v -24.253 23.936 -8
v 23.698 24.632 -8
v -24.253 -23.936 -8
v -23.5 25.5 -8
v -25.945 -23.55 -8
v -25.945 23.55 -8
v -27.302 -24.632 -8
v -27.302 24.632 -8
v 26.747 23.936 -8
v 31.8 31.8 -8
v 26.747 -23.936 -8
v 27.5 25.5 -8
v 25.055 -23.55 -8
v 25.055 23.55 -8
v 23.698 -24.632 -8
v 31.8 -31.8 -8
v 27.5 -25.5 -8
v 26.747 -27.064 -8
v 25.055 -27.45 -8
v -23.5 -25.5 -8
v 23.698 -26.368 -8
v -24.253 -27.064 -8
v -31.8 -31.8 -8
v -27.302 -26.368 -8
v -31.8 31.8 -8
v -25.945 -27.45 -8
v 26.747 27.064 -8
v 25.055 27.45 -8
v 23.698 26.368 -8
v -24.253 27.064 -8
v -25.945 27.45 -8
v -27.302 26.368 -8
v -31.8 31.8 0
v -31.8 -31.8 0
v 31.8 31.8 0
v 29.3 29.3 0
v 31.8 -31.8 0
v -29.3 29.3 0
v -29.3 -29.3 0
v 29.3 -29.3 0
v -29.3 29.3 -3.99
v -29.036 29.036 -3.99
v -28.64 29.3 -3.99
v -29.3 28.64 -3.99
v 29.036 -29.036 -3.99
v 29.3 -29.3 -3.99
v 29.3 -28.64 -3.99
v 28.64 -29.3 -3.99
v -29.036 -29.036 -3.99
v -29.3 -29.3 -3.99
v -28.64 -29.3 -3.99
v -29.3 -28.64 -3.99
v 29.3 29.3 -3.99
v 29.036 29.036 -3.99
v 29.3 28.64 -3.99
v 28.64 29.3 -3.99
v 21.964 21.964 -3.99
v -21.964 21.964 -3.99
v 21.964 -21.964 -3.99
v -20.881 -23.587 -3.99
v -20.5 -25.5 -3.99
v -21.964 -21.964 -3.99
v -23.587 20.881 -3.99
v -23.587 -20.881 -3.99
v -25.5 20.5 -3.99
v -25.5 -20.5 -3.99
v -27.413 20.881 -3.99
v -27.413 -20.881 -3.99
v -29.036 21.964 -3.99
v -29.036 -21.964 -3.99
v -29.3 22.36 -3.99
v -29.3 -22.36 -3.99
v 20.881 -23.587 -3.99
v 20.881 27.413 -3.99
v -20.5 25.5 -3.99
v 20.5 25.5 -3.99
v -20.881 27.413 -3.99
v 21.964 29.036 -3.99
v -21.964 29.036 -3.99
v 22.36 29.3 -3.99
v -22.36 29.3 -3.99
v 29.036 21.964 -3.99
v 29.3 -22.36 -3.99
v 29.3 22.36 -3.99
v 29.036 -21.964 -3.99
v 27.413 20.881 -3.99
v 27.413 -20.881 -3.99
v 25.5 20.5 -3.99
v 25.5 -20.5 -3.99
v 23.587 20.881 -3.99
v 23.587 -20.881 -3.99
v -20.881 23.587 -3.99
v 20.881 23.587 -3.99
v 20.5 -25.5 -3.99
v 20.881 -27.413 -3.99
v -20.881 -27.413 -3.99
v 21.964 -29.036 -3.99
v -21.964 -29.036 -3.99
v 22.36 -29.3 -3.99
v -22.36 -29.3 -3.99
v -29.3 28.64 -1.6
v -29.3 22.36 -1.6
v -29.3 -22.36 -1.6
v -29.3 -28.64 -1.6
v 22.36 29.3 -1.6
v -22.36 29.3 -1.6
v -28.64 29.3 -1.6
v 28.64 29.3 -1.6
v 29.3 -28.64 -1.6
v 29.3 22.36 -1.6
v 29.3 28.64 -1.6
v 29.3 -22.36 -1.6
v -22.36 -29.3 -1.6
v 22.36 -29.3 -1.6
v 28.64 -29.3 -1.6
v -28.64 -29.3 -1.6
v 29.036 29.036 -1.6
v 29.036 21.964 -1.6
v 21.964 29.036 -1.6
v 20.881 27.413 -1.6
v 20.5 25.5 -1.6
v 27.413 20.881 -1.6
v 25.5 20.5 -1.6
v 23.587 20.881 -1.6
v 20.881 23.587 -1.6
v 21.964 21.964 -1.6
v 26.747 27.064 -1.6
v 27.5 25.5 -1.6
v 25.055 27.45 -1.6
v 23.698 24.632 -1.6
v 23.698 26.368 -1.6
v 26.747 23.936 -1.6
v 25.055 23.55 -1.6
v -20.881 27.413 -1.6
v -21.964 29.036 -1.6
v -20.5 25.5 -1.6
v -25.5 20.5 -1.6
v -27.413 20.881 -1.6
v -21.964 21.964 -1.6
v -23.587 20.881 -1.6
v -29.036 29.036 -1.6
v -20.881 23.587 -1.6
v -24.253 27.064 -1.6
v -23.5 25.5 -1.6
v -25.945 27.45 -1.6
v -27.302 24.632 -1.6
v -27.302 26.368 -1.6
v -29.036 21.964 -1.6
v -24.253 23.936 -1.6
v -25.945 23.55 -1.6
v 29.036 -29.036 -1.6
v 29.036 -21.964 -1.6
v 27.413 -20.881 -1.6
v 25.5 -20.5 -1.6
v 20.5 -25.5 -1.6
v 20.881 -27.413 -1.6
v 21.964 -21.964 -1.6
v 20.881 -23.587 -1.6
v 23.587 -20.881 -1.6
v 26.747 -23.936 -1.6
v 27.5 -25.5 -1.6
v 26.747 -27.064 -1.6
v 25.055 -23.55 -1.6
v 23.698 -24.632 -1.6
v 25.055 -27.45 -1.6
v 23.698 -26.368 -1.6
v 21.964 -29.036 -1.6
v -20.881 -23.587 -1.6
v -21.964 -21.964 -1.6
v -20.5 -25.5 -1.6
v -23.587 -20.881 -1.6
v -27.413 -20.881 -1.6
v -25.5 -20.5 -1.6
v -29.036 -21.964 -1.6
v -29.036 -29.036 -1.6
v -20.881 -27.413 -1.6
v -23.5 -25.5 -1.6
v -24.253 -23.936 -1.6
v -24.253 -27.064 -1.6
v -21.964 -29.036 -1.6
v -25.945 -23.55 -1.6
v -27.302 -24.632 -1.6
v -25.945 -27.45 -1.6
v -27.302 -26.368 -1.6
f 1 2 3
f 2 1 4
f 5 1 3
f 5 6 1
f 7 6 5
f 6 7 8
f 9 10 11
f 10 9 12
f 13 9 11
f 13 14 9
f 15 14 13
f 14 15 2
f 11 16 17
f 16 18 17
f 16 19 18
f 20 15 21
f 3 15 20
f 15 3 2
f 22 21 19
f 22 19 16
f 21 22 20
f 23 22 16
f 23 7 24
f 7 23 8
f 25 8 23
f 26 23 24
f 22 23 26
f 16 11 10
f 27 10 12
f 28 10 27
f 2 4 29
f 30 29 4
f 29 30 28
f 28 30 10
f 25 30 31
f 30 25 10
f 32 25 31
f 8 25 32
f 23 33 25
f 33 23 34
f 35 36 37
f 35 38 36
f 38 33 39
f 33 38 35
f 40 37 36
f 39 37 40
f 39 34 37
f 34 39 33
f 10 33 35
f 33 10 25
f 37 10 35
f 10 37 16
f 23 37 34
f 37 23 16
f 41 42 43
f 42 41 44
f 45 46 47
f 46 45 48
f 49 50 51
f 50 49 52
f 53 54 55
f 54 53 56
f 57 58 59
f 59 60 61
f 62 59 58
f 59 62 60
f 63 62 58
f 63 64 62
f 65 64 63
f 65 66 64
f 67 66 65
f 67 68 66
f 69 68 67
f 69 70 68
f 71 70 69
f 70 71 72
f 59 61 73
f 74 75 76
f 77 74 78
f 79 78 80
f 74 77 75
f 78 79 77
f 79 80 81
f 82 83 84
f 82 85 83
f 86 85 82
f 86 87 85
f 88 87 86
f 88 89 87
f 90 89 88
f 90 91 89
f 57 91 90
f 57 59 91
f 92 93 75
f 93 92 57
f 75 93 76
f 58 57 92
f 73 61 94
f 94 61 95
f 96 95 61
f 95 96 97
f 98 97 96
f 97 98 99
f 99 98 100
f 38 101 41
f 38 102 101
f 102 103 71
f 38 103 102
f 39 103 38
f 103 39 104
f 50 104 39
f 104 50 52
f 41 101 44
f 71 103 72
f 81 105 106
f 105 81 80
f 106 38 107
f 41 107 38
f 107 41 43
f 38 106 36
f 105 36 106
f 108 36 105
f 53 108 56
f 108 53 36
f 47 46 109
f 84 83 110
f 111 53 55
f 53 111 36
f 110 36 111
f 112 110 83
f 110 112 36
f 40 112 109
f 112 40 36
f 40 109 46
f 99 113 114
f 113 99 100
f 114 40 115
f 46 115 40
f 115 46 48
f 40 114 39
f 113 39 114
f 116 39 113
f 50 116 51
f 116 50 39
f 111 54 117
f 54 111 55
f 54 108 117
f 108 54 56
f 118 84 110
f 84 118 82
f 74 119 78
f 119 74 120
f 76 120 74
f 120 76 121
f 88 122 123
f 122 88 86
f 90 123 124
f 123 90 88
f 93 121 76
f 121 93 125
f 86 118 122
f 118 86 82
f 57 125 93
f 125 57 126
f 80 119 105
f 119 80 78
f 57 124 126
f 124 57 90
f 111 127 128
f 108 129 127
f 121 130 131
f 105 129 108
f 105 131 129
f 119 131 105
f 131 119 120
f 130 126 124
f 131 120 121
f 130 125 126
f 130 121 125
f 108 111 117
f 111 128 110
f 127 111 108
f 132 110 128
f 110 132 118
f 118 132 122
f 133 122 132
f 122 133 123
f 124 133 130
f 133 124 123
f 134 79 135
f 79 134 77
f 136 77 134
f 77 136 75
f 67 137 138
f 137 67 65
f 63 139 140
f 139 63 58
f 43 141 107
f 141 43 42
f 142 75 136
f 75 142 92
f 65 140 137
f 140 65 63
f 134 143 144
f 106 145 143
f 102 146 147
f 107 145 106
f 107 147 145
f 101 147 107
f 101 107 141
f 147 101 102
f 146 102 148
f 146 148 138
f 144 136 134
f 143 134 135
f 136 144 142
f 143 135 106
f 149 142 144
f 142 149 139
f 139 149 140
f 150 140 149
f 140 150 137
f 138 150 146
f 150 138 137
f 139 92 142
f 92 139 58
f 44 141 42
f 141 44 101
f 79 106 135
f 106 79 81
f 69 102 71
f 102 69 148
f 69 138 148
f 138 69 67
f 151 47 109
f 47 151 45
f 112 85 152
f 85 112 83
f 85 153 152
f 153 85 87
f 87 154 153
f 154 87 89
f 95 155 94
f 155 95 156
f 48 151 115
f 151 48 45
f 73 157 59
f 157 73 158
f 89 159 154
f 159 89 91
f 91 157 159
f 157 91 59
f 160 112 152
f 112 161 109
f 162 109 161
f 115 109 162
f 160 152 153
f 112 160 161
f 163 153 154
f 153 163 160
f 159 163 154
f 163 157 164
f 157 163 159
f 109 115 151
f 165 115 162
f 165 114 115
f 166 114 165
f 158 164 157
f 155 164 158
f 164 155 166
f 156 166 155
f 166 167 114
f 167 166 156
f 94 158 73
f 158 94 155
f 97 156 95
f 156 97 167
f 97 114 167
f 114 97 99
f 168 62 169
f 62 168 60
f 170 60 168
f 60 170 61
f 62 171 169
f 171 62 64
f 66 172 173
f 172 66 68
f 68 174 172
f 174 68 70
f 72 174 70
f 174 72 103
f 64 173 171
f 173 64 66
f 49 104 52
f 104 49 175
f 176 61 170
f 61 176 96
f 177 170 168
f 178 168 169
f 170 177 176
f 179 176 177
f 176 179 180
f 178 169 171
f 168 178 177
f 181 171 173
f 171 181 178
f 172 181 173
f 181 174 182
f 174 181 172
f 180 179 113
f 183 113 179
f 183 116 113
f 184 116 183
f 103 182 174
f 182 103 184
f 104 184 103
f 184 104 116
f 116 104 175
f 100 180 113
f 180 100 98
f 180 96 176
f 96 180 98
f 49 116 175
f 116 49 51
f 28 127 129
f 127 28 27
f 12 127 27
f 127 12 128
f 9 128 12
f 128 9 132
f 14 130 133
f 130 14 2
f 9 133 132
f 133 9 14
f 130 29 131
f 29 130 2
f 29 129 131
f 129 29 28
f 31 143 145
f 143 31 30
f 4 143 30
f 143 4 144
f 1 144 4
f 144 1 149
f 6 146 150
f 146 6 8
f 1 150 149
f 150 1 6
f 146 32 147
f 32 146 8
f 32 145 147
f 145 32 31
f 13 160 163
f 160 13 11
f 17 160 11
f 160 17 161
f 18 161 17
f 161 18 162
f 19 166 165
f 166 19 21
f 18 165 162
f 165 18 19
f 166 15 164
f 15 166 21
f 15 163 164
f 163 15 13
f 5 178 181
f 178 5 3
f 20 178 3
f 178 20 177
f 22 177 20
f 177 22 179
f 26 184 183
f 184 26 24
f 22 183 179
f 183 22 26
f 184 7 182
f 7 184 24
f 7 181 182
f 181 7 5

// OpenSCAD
pcb_thickness = 1.6;

module Case() {
  board_size = [58.6, 58.6];

  height = 8;
  tray_depth = 4;

  screw_centres = [51, 51];
  screw_positions = [
    [screw_centres[0] / 2, screw_centres[1] / 2],
    [-screw_centres[0] / 2, screw_centres[1] / 2],
    [screw_centres[0] / 2, -screw_centres[1] / 2],
    [-screw_centres[0] / 2, -screw_centres[1] / 2],
  ];

  difference() {
    union() {
      difference() {
        translate([0, 0, -height]) {
          linear_extrude(height) {
            square(board_size + [5, 5], center = true);
          }
        }

        translate([0, 0, 0.01 - tray_depth]) {
          linear_extrude(tray_depth) {
            square(board_size, center = true);
          }
        }
      }

      translate([0, 0, -tray_depth]) {
        for(p = screw_positions) {
          translate(p) {
            cylinder(d = 10, h = abs(tray_depth) - pcb_thickness);
          }
        }
      }
    }

    translate([0, 0, -height - 1]) {
      for(p = screw_positions) {
        translate(p) {
          cylinder(d = 4, h = height + 2);
        }
      }
    }
  }
}

Case();
